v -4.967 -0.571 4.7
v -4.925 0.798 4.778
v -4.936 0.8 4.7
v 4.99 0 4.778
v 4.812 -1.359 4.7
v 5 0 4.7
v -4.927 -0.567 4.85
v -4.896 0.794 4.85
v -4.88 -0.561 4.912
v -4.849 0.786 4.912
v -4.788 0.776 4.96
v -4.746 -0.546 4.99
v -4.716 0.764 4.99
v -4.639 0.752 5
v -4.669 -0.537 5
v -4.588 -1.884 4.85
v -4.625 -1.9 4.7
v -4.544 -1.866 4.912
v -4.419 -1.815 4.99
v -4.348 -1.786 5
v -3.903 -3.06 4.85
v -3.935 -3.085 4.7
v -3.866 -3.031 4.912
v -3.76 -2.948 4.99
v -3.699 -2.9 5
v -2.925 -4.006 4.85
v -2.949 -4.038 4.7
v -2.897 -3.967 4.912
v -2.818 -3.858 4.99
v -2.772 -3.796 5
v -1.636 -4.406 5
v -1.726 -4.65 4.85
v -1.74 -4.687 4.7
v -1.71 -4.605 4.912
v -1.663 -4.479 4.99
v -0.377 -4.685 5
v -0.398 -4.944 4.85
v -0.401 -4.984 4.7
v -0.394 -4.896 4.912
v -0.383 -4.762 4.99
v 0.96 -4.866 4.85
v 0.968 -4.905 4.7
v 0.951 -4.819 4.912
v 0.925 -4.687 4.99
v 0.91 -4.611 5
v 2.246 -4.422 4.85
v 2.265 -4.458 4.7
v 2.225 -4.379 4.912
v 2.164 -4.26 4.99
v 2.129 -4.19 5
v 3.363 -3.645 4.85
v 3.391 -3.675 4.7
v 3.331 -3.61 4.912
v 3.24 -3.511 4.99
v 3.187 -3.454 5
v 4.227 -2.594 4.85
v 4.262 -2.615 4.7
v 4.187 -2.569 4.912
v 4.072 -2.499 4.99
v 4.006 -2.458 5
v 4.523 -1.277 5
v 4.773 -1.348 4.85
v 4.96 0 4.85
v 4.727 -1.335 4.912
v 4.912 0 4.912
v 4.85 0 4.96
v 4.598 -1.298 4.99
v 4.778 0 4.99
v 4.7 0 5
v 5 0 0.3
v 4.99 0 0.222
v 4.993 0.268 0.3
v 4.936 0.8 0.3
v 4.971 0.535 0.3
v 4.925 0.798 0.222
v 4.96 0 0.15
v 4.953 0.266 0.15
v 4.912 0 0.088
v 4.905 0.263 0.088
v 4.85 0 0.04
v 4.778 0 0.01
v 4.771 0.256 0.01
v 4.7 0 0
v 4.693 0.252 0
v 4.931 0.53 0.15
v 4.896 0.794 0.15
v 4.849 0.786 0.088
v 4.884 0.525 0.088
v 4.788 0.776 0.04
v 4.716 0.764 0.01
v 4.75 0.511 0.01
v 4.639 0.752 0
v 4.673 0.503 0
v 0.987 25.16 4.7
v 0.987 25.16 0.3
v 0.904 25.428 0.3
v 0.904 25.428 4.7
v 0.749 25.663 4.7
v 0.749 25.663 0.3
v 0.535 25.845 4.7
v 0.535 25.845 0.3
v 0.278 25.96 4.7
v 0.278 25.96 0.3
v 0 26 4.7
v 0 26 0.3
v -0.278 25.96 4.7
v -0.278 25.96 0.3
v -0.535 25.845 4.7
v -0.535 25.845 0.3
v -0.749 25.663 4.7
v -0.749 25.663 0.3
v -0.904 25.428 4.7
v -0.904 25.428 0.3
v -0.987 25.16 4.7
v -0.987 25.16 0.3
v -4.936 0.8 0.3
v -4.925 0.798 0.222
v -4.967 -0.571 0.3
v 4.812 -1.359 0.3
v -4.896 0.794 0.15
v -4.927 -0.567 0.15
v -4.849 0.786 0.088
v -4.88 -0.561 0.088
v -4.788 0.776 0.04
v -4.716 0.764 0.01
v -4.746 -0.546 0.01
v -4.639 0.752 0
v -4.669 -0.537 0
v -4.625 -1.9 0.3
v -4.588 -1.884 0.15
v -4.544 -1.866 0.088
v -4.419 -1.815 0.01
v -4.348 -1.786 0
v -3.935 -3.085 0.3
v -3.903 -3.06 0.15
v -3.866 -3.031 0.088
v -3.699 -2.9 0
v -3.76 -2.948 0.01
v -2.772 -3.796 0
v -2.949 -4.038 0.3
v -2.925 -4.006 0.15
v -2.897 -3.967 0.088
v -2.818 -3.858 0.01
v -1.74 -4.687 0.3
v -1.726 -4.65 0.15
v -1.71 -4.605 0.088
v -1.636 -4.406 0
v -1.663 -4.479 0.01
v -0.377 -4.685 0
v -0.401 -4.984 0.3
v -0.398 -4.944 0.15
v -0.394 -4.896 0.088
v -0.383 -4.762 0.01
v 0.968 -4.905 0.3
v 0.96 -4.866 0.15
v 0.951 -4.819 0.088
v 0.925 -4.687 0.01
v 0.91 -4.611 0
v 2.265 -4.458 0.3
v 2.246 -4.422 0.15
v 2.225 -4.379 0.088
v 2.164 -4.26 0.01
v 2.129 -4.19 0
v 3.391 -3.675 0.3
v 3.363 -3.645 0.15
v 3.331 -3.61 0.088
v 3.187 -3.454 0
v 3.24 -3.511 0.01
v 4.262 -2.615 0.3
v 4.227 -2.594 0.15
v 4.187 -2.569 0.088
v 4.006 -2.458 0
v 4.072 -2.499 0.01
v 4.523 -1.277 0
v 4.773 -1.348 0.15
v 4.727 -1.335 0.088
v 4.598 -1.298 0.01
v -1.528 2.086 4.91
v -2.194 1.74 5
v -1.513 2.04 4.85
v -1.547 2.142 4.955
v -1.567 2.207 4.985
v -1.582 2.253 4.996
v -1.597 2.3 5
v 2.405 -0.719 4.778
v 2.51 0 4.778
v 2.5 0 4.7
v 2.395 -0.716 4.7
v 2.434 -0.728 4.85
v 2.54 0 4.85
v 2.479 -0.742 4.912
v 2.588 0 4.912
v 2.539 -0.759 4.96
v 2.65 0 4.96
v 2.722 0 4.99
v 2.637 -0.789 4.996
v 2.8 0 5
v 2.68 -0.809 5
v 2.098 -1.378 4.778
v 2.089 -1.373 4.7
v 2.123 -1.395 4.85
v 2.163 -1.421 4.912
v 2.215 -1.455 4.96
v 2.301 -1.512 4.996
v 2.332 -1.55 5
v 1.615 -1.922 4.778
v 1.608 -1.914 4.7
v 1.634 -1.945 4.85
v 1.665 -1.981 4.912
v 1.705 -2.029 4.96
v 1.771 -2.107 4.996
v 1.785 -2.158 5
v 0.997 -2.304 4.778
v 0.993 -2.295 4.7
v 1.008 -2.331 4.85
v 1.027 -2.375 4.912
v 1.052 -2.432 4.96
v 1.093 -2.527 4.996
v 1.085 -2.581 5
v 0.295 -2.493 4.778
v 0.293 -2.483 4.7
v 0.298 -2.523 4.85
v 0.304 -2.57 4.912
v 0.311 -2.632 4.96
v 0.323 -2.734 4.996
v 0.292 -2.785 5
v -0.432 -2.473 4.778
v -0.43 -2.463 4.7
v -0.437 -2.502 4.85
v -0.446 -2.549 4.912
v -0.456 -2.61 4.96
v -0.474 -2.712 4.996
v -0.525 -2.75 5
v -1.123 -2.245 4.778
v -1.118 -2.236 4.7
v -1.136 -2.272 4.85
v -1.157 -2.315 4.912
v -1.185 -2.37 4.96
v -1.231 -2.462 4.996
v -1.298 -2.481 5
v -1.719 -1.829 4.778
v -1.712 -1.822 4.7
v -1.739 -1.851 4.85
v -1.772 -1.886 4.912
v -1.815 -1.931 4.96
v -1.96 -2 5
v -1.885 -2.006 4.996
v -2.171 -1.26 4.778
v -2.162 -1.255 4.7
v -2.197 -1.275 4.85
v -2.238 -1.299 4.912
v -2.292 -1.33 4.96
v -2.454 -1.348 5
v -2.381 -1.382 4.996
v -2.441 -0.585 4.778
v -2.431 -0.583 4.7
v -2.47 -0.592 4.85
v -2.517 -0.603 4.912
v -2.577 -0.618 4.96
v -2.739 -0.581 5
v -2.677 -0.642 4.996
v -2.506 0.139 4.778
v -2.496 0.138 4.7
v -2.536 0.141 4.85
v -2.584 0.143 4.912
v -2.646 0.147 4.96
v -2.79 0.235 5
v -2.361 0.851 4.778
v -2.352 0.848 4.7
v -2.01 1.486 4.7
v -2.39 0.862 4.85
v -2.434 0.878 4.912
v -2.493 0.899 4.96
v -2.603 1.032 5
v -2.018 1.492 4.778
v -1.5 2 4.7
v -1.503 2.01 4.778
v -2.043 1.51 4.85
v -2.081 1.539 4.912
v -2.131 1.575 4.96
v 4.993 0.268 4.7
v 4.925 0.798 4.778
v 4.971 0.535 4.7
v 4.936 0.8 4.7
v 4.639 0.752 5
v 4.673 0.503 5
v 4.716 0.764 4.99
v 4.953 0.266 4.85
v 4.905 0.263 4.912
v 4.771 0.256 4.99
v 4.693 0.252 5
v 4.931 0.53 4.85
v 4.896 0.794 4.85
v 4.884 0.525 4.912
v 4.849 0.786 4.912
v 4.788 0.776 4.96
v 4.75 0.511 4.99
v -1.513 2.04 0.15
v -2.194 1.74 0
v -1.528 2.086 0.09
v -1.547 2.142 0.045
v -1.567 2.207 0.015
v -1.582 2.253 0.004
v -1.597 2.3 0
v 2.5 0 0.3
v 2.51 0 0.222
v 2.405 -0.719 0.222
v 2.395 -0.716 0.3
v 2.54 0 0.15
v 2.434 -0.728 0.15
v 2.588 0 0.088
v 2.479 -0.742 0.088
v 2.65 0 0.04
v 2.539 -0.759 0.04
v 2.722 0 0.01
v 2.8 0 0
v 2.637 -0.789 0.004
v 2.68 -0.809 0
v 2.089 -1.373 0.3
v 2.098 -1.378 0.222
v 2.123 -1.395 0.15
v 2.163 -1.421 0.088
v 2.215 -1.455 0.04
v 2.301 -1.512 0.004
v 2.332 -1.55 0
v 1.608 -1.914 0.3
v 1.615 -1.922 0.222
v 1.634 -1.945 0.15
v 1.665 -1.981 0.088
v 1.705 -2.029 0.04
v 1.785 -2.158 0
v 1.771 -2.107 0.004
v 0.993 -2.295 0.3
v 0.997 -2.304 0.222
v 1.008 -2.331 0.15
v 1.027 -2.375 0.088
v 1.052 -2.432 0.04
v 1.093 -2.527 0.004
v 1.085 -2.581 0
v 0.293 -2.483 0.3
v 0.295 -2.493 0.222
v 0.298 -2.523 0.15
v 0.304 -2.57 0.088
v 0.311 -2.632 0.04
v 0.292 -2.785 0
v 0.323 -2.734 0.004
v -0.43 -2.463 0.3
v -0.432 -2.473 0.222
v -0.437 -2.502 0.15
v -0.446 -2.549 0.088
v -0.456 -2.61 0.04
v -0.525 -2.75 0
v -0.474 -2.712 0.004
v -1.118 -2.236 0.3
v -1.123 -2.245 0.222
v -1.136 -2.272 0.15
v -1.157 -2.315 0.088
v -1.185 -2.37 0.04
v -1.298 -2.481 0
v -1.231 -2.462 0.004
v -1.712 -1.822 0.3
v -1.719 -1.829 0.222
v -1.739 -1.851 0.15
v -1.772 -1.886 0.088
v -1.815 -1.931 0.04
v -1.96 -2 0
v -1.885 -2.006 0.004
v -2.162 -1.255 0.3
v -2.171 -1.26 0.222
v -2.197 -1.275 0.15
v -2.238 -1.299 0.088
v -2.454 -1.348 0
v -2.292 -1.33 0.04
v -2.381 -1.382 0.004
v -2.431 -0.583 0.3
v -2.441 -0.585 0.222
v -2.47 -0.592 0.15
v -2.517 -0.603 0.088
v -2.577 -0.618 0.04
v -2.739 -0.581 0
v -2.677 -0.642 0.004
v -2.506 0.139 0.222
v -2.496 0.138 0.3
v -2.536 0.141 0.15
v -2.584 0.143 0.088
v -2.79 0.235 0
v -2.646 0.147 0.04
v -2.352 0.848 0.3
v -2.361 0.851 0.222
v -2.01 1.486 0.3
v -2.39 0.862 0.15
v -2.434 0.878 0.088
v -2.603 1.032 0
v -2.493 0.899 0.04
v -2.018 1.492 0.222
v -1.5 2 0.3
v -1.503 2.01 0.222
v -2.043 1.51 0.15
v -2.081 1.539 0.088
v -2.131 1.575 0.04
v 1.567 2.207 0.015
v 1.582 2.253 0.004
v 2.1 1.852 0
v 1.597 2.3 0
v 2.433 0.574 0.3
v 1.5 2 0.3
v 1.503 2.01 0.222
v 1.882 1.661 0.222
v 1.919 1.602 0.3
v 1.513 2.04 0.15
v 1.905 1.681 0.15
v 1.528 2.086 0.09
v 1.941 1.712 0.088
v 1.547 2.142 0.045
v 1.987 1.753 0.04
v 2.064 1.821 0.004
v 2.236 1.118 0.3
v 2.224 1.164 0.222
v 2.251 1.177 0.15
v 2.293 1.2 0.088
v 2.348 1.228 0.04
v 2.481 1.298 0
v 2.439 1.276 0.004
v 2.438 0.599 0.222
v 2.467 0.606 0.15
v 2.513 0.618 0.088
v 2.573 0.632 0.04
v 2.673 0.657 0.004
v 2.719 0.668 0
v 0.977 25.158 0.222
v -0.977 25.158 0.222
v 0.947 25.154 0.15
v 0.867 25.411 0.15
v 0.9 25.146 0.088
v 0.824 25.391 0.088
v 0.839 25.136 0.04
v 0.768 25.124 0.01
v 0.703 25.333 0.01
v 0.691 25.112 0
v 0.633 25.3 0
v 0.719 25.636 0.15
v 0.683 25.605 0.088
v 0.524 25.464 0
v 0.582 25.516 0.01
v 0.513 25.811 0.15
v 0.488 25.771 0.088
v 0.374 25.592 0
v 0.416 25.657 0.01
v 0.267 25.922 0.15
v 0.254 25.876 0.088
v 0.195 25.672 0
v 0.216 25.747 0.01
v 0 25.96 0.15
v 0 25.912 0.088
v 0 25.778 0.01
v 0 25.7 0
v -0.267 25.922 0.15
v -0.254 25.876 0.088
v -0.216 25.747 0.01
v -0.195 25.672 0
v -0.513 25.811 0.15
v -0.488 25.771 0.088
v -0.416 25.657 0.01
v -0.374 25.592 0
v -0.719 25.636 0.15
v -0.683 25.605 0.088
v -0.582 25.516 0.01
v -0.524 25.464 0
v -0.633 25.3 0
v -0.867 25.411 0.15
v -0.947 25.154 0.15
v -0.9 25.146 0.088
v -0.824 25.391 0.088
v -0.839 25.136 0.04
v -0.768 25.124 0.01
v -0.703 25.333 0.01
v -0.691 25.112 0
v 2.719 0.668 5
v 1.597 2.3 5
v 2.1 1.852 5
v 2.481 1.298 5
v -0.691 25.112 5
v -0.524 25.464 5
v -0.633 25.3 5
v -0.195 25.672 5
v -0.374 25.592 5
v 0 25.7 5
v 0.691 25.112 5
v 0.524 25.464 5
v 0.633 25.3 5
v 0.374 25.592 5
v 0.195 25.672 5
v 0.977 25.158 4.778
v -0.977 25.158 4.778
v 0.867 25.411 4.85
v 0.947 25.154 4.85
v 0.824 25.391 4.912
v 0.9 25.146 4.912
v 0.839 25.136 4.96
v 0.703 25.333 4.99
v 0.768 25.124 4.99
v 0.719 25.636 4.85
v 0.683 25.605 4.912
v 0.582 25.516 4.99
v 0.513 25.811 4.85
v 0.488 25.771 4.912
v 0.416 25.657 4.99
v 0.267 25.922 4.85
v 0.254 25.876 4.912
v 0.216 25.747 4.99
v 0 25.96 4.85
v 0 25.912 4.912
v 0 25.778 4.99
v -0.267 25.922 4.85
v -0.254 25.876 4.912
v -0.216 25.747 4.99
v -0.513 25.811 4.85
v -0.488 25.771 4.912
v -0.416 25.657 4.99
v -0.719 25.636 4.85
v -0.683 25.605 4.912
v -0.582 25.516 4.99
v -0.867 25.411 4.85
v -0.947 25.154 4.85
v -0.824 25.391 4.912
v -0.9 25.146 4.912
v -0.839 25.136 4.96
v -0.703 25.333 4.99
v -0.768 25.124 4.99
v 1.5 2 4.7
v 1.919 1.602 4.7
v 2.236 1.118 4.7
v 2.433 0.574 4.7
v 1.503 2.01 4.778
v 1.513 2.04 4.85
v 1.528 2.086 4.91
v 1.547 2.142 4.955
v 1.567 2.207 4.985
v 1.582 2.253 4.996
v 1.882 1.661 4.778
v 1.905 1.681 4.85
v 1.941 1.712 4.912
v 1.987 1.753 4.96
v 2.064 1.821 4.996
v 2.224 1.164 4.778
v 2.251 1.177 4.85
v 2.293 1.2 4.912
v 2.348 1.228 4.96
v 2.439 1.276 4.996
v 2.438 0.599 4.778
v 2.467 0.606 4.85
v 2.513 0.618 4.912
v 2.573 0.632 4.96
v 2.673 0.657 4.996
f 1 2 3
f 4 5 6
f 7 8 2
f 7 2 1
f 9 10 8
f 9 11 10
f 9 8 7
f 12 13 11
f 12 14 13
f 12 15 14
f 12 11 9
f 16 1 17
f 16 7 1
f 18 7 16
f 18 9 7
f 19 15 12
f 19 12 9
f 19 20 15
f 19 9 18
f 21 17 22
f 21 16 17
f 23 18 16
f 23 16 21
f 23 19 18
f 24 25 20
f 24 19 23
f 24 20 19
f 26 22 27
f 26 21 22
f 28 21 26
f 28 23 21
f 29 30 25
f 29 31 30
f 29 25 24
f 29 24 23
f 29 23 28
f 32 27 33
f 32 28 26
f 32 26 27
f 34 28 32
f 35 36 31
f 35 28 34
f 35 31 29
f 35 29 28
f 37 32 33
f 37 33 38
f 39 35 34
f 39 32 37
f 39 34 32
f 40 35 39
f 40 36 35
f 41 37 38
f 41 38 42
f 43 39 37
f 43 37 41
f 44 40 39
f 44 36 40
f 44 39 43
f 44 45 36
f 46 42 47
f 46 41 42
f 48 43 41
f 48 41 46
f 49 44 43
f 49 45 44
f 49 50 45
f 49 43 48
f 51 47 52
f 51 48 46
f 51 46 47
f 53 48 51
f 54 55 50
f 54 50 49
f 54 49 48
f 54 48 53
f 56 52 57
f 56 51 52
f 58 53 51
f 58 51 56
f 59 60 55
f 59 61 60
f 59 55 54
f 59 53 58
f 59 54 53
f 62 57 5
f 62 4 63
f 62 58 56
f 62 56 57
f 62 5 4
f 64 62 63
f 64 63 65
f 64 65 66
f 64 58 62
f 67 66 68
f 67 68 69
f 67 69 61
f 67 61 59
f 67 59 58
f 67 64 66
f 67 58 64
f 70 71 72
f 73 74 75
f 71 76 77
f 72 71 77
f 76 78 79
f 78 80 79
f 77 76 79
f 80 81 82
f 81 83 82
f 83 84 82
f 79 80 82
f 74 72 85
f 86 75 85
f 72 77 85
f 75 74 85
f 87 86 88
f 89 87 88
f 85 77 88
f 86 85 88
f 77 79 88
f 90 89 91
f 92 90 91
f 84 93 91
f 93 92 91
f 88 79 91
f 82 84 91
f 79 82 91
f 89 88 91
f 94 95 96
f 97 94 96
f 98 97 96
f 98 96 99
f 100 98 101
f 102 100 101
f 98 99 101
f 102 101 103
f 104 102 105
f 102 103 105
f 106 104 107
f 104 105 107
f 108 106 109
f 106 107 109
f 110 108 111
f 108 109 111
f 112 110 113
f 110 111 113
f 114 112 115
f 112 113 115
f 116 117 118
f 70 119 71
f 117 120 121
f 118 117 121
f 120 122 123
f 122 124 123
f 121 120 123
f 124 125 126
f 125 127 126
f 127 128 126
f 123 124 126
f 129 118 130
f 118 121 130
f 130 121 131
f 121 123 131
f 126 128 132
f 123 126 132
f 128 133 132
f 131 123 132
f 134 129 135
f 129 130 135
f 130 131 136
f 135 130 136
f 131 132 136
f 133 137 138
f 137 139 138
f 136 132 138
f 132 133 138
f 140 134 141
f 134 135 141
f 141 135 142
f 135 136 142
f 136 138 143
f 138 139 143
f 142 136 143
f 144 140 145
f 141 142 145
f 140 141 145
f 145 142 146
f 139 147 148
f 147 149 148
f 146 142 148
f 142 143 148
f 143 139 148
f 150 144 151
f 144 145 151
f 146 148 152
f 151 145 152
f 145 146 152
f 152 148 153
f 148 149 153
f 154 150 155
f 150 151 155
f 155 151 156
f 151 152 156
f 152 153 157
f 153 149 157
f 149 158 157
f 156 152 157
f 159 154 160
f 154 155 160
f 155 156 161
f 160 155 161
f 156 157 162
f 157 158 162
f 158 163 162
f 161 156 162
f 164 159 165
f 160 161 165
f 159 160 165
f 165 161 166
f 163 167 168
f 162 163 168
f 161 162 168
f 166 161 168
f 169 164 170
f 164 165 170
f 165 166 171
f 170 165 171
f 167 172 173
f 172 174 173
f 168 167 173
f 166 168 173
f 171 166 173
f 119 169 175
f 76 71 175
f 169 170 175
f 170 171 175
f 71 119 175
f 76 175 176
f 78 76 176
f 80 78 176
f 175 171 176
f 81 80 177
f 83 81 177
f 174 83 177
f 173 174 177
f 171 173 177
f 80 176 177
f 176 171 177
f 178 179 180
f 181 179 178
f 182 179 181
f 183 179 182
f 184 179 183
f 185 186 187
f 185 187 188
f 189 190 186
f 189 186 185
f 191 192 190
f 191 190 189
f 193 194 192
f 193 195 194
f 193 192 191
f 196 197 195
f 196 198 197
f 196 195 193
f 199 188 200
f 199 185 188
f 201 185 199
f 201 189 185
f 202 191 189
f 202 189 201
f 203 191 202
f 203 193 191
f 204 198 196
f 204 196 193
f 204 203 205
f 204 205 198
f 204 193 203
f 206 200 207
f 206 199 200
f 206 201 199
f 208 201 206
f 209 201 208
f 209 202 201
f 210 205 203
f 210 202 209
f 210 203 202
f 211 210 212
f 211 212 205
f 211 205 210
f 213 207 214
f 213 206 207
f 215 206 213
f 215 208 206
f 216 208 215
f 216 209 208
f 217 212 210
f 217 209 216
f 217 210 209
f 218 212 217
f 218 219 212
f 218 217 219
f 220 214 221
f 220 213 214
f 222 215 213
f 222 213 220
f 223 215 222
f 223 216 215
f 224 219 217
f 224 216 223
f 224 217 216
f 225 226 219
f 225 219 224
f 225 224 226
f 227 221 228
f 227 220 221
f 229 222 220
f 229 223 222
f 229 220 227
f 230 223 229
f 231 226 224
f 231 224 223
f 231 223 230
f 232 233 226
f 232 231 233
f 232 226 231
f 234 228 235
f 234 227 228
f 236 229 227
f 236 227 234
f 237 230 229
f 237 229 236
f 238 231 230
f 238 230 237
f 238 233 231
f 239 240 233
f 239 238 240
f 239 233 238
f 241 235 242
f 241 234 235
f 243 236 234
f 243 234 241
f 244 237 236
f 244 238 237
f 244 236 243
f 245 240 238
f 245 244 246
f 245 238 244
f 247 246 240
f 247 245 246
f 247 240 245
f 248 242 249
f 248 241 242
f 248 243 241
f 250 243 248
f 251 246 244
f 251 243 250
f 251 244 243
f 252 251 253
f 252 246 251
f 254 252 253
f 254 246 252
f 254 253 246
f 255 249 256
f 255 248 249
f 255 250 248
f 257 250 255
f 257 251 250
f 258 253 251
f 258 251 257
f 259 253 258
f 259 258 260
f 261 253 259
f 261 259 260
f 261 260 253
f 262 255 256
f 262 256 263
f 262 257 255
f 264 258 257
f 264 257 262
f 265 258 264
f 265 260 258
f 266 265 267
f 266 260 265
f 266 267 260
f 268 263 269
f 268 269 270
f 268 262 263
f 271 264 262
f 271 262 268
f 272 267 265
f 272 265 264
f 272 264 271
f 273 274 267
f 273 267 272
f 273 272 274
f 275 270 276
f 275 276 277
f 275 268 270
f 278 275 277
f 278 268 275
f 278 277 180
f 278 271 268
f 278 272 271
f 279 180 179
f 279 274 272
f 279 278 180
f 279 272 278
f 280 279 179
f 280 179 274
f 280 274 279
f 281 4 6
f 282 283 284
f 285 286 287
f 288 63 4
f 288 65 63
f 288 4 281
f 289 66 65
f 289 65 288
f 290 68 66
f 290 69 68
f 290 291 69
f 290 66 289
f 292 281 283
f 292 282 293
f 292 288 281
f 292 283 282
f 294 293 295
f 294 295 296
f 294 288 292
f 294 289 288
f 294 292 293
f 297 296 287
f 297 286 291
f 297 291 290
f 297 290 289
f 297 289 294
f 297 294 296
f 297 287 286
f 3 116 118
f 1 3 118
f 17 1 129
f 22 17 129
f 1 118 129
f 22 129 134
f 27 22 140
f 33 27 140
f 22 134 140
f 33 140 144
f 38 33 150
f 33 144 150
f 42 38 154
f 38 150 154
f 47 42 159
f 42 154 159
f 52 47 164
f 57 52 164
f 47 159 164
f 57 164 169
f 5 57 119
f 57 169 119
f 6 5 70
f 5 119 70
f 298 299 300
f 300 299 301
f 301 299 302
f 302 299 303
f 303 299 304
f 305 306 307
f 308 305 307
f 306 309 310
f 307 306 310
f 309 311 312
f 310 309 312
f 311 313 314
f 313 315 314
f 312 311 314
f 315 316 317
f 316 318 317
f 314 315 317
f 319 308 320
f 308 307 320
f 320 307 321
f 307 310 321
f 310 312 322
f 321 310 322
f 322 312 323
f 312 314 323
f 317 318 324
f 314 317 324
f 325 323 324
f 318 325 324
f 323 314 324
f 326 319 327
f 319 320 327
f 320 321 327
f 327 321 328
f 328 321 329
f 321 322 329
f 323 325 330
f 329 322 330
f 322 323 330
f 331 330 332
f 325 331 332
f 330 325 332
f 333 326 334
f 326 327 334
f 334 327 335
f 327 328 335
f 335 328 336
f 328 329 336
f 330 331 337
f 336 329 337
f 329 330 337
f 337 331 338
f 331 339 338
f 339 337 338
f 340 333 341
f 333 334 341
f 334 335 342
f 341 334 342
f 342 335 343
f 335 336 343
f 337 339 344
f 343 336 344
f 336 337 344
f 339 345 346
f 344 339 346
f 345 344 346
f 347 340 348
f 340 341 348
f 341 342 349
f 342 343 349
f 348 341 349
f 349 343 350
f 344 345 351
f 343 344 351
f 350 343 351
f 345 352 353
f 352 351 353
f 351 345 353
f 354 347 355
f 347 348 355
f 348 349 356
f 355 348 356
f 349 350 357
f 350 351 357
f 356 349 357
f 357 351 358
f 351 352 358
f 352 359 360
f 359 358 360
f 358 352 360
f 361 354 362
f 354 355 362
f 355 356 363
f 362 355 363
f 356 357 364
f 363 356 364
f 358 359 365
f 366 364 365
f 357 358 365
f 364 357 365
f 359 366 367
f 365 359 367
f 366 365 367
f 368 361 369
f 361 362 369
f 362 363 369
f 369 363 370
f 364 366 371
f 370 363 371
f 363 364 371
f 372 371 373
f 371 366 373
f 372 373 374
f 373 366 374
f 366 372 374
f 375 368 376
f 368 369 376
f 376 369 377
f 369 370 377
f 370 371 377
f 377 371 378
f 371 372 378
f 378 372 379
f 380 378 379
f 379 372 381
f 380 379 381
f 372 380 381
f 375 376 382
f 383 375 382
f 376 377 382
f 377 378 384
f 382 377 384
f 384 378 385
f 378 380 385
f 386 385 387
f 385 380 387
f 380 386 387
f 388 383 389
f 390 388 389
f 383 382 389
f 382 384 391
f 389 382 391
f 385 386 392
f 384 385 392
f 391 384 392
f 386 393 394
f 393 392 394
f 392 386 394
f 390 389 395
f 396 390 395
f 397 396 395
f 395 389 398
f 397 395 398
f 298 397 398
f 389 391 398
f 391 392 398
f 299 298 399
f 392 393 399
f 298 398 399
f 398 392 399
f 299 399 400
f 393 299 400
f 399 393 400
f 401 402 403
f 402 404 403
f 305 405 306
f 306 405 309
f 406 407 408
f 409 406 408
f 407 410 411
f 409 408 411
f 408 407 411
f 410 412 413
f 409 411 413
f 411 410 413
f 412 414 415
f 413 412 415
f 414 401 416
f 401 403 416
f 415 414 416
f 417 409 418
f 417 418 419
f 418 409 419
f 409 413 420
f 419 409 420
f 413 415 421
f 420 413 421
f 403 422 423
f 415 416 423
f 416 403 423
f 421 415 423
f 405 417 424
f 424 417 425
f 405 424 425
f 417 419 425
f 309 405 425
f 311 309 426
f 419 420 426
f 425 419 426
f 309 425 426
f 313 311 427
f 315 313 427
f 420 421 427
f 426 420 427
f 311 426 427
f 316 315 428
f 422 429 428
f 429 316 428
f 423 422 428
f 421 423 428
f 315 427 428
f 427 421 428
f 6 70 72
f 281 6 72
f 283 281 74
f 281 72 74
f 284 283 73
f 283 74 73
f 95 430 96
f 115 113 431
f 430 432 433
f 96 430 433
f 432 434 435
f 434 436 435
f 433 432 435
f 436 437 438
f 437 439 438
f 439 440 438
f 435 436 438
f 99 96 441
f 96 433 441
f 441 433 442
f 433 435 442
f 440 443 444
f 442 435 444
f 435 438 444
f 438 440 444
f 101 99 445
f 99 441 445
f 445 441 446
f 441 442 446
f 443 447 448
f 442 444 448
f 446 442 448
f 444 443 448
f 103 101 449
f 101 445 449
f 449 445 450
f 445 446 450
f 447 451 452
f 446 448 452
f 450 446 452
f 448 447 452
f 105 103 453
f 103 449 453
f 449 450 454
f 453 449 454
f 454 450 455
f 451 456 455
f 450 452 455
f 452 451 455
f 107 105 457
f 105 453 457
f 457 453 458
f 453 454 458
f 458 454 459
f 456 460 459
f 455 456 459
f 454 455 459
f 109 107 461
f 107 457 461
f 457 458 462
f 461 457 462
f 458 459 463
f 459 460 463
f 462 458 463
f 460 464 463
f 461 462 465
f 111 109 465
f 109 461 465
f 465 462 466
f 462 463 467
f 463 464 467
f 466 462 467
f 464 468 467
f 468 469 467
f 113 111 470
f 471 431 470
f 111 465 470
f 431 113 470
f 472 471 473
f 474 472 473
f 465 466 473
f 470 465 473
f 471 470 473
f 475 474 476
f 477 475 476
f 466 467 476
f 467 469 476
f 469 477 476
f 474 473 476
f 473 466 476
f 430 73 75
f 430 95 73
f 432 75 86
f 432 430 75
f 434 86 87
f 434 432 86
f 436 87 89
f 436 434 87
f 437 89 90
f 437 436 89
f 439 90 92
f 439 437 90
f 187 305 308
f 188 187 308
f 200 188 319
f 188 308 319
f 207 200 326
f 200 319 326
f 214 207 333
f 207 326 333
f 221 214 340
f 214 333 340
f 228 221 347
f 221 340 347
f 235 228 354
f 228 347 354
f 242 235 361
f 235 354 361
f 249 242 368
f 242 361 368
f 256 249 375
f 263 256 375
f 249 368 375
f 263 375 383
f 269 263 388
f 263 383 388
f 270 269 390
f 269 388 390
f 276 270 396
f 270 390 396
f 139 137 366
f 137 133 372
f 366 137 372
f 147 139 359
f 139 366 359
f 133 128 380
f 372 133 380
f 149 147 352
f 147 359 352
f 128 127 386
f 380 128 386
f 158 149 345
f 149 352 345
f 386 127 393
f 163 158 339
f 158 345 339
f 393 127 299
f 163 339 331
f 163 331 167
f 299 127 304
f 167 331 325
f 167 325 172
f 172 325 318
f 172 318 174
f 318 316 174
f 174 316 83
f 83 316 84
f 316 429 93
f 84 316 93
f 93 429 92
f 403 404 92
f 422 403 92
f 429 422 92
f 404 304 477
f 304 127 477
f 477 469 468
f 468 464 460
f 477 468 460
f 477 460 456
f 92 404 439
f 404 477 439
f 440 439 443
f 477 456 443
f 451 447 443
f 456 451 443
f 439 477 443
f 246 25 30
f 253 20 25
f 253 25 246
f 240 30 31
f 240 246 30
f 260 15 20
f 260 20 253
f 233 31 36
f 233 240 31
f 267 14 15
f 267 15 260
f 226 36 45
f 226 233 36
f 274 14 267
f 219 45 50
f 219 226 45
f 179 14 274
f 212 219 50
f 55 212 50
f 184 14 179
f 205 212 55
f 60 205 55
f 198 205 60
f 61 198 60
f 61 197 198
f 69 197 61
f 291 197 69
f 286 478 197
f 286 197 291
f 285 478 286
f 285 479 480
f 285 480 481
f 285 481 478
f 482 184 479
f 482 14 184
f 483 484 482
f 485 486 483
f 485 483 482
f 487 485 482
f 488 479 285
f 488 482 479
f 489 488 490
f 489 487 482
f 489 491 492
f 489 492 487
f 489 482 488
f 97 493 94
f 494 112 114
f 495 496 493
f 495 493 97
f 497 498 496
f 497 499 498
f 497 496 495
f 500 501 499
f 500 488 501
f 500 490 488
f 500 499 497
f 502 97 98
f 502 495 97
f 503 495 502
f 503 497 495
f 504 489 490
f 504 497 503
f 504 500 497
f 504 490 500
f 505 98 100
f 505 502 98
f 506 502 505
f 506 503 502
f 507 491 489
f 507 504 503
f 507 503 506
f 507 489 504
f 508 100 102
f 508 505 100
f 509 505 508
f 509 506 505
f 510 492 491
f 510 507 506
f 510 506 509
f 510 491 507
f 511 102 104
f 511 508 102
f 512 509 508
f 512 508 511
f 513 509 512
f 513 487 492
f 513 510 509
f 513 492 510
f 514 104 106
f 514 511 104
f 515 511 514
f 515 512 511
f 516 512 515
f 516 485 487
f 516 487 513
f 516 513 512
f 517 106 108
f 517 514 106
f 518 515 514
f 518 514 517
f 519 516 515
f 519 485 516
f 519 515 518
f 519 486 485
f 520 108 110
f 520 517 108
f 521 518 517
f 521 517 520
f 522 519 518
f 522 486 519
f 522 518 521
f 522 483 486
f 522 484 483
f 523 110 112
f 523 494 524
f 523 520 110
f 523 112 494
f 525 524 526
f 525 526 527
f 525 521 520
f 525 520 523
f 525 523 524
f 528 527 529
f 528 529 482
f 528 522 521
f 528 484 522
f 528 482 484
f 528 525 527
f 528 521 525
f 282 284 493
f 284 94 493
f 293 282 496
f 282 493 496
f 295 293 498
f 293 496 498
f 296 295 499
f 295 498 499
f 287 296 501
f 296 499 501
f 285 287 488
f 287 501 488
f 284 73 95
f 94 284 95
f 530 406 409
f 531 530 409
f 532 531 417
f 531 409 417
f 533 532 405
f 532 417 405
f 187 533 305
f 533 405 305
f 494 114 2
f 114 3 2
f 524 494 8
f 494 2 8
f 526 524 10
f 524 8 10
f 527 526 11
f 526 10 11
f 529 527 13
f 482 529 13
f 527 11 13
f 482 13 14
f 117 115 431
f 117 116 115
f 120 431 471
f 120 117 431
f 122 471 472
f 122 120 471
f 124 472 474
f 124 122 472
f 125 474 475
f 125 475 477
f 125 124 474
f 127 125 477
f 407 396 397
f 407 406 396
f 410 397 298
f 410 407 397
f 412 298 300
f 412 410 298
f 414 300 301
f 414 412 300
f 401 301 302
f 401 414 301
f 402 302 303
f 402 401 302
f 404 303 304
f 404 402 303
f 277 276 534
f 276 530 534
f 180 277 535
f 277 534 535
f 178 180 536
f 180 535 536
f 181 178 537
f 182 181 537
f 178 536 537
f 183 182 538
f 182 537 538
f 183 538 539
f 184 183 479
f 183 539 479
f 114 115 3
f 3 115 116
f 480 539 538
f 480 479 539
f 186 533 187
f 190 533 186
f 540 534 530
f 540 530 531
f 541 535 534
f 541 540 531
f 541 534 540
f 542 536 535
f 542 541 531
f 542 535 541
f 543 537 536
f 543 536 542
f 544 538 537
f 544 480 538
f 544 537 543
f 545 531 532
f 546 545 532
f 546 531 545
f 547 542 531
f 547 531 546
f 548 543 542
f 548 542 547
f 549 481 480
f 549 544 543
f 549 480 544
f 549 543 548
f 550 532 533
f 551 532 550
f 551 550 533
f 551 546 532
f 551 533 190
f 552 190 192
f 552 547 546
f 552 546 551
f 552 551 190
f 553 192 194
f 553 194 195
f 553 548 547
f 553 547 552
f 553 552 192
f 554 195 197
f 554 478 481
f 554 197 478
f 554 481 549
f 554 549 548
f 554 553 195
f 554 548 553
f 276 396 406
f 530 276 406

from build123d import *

# Parameters (mm, degrees)
F1_DEPTH = 5
F2_R     = 0.3


with BuildPart() as f1:
    # F0 (on Top) → F1 (new body)
    with BuildSketch(Plane.XY):
        with BuildLine():
            ThreePointArc((-4.935585, 0.8), (0, 5), (4.935585, 0.8))
            Line((4.935585, 0.8), (0.987117, 25.16))
            ThreePointArc((0.987117, 25.16), (0, 26), (-0.987117, 25.16))
            Line((-0.987117, 25.16), (-4.935585, 0.8))
        make_face()
        with BuildLine():
            ThreePointArc((-4.935585, 0.8), (-0.401295, -4.98387), (5, 0))
            ThreePointArc((5, 0), (4.98387, 0.401295), (4.935585, 0.8))
            ThreePointArc((4.935585, 0.8), (0, 5), (-4.935585, 0.8))
        make_face()
        with BuildLine():
            ThreePointArc((1.5, 2), (2.236068, 1.118034), (2.5, 0))
            ThreePointArc((2.5, 0), (-1.118034, -2.236068), (-1.5, 2))
            ThreePointArc((-1.5, 2), (0, 2.5), (1.5, 2))
        make_face(mode=Mode.SUBTRACT)
        with BuildLine():
            Line((-1.5, 2), (1.5, 2))
            ThreePointArc((1.5, 2), (0, 2.5), (-1.5, 2))
        make_face()
    extrude(amount=F1_DEPTH)

    # F2
    f2_edges = [f1.edges().sort_by_distance(p)[0] for p in [
        (-0.401295, -4.98387, 5),
        (4.98387, 0.401295, 5),
        (2.961351, 12.98, 5),
        (0, 26, 5),
        (-2.961351, 12.98, 5),
        (0, -2.5, 5),
        (0, 2, 5),
        (4.98387, 0.401295, 0),
        (2.961351, 12.98, 0),
        (0, 26, 0),
        (-2.961351, 12.98, 0),
        (-0.401295, -4.98387, 0),
        (0, -2.5, 0),
        (0, 2, 0),
    ]]
    fillet(f2_edges, radius=F2_R)


solid = f1.part
